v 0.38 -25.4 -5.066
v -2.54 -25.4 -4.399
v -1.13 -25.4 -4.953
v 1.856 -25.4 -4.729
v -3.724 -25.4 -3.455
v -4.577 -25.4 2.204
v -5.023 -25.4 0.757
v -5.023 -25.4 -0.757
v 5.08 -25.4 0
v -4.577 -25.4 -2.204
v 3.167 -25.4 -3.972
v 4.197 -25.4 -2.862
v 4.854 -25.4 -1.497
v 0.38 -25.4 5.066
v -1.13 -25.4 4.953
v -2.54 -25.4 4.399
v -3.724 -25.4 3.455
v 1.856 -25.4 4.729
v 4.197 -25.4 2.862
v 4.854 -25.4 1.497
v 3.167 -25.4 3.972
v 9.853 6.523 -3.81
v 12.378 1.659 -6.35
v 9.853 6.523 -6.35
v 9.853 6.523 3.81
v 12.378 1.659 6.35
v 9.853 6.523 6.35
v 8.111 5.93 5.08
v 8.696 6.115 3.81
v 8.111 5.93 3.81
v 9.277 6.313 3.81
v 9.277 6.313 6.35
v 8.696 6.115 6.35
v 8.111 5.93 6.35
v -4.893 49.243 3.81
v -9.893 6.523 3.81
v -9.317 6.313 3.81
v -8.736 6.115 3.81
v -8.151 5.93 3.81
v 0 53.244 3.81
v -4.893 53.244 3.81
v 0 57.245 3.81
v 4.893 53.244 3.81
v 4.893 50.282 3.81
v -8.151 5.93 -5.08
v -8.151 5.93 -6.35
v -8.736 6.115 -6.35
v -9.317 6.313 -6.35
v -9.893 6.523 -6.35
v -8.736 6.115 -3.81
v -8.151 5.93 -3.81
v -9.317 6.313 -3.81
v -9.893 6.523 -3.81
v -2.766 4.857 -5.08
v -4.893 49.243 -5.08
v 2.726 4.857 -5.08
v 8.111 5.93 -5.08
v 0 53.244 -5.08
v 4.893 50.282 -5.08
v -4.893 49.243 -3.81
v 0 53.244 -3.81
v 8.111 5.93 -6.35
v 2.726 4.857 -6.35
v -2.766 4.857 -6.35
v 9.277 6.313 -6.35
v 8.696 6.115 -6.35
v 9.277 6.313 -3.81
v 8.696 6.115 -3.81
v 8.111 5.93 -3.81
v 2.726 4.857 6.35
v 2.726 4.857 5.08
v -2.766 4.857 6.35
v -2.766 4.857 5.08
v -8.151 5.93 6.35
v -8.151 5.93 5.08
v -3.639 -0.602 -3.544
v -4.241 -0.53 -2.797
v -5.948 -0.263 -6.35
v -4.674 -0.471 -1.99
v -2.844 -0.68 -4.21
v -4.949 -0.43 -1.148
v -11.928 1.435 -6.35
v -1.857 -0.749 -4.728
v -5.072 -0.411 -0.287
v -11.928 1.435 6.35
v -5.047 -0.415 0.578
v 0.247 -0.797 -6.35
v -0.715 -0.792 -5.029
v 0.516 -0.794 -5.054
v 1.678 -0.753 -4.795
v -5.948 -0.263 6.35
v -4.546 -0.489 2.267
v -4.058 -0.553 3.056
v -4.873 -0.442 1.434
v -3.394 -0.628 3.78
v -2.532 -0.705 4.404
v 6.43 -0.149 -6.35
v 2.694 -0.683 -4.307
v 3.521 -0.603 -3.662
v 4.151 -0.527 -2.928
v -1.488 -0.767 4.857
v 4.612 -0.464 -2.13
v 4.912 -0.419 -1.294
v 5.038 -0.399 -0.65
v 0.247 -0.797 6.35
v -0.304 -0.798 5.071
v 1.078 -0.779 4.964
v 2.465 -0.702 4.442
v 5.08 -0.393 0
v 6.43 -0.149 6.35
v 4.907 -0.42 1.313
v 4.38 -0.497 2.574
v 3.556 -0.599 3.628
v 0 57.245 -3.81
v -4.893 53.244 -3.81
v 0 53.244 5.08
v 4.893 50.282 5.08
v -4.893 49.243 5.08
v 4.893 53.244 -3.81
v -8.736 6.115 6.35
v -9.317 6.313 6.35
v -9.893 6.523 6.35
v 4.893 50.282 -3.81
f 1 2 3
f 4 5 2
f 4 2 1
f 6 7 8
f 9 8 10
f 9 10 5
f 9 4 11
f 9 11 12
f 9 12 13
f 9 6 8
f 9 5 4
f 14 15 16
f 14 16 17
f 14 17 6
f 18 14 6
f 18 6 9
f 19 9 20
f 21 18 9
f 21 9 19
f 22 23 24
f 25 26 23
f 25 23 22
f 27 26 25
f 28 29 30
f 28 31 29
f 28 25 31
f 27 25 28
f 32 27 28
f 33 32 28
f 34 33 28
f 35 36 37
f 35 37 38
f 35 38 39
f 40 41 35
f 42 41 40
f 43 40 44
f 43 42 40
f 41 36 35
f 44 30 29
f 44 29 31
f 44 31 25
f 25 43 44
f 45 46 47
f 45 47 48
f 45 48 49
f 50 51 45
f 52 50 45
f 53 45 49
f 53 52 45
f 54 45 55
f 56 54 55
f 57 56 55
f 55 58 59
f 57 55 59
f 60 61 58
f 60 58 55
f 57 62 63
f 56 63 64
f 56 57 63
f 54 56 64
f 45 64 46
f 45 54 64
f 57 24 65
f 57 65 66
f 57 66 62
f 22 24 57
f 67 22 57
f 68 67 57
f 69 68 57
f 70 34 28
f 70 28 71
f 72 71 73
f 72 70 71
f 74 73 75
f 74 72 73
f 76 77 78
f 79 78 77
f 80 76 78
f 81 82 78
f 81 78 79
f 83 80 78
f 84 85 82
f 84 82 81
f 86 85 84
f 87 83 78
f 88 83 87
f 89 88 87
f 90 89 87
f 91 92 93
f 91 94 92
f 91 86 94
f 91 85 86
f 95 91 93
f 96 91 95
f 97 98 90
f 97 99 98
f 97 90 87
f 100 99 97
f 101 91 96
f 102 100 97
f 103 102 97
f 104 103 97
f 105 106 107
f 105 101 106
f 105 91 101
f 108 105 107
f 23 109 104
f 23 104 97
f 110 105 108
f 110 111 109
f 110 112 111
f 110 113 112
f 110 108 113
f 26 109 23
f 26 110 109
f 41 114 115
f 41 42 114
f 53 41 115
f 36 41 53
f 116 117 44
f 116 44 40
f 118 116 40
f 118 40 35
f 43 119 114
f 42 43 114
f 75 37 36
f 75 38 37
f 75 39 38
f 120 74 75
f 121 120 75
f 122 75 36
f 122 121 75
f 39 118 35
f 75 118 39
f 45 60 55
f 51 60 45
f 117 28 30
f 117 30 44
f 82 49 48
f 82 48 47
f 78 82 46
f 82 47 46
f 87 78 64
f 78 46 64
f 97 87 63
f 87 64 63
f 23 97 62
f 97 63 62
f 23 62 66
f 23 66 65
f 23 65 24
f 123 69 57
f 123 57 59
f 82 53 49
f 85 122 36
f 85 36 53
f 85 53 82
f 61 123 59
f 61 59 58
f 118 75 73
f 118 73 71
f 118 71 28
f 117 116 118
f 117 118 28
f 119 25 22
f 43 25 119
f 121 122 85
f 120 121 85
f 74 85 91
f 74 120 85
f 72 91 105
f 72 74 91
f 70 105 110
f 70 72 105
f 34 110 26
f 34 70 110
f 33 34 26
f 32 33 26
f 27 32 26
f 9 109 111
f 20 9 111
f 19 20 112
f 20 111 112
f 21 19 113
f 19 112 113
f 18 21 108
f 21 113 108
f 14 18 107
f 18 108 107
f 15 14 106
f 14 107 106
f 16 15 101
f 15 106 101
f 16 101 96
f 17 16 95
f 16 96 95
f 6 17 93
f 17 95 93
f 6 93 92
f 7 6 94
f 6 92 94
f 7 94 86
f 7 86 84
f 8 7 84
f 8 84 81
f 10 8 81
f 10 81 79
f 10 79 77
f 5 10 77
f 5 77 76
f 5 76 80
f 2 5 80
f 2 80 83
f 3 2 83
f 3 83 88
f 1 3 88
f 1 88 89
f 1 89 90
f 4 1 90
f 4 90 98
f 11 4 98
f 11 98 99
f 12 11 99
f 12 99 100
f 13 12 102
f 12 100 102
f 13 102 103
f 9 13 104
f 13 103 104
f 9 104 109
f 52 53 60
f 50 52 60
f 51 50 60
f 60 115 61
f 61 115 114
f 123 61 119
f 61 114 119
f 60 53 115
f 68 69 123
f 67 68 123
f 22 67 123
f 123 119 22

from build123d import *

# Parameters (mm, degrees)
F1_DEPTH = 6.35
F2_R     = 5.08
F3_DEPTH = 25.4
F4_DEPTH = 3.81
F5_DEPTH = 5.08


with BuildPart() as f1:
    # F0 (on Top) → F1 (new body, symmetric)
    with BuildSketch(Plane.XY):
        with BuildLine():
            ThreePointArc((-8.150841, 5.930474), (-9.027019, 6.212621), (-9.893435, 6.523457))
            Line((-9.893435, 6.523457), (-11.928295, 1.434566))
            ThreePointArc((-11.928295, 1.434566), (0.246561, -0.797492), (12.378132, 1.65897))
            Line((12.378132, 1.65897), (9.853429, 6.523457))
            ThreePointArc((9.853429, 6.523457), (8.987013, 6.212621), (8.110835, 5.930474))
            ThreePointArc((8.110835, 5.930474), (-0.020003, 4.722101), (-8.150841, 5.930474))
        make_face()
    extrude(amount=F1_DEPTH, both=True)

    # F2 (on Front) → F3 (join)
    with BuildSketch(Plane.XZ):
        Circle(F2_R)
    extrude(amount=F3_DEPTH)

    # F0 (on Top) → F4 (join, symmetric)
    with BuildSketch(Plane.XY):
        with BuildLine():
            Line((-4.892698, 53.244065), (-9.893435, 6.523457))
            ThreePointArc((-9.893435, 6.523457), (-9.027019, 6.212621), (-8.150841, 5.930474))
            Line((-8.150841, 5.930474), (-4.892698, 49.243495))
            Line((-4.892698, 49.243495), (0, 53.244065))
            Line((0, 53.244065), (4.8927, 50.282495))
            Line((4.8927, 50.282495), (8.110835, 5.930474))
            ThreePointArc((8.110835, 5.930474), (8.987013, 6.212621), (9.853429, 6.523457))
            Line((9.853429, 6.523457), (4.8927, 53.244065))
            Line((4.8927, 53.244065), (0, 57.244636))
            Line((0, 57.244636), (-4.892698, 53.244065))
        make_face()
    extrude(amount=F4_DEPTH, both=True)

    # F0 (on Top) → F5 (join, symmetric)
    with BuildSketch(Plane.XY):
        with BuildLine():
            Line((-4.892698, 49.243495), (-8.150841, 5.930474))
            ThreePointArc((-8.150841, 5.930474), (-0.020003, 4.722101), (8.110835, 5.930474))
            Line((8.110835, 5.930474), (4.8927, 50.282495))
            Line((4.8927, 50.282495), (0, 53.244065))
            Line((0, 53.244065), (-4.892698, 49.243495))
        make_face()
    extrude(amount=F5_DEPTH, both=True)


solid = f1.part
